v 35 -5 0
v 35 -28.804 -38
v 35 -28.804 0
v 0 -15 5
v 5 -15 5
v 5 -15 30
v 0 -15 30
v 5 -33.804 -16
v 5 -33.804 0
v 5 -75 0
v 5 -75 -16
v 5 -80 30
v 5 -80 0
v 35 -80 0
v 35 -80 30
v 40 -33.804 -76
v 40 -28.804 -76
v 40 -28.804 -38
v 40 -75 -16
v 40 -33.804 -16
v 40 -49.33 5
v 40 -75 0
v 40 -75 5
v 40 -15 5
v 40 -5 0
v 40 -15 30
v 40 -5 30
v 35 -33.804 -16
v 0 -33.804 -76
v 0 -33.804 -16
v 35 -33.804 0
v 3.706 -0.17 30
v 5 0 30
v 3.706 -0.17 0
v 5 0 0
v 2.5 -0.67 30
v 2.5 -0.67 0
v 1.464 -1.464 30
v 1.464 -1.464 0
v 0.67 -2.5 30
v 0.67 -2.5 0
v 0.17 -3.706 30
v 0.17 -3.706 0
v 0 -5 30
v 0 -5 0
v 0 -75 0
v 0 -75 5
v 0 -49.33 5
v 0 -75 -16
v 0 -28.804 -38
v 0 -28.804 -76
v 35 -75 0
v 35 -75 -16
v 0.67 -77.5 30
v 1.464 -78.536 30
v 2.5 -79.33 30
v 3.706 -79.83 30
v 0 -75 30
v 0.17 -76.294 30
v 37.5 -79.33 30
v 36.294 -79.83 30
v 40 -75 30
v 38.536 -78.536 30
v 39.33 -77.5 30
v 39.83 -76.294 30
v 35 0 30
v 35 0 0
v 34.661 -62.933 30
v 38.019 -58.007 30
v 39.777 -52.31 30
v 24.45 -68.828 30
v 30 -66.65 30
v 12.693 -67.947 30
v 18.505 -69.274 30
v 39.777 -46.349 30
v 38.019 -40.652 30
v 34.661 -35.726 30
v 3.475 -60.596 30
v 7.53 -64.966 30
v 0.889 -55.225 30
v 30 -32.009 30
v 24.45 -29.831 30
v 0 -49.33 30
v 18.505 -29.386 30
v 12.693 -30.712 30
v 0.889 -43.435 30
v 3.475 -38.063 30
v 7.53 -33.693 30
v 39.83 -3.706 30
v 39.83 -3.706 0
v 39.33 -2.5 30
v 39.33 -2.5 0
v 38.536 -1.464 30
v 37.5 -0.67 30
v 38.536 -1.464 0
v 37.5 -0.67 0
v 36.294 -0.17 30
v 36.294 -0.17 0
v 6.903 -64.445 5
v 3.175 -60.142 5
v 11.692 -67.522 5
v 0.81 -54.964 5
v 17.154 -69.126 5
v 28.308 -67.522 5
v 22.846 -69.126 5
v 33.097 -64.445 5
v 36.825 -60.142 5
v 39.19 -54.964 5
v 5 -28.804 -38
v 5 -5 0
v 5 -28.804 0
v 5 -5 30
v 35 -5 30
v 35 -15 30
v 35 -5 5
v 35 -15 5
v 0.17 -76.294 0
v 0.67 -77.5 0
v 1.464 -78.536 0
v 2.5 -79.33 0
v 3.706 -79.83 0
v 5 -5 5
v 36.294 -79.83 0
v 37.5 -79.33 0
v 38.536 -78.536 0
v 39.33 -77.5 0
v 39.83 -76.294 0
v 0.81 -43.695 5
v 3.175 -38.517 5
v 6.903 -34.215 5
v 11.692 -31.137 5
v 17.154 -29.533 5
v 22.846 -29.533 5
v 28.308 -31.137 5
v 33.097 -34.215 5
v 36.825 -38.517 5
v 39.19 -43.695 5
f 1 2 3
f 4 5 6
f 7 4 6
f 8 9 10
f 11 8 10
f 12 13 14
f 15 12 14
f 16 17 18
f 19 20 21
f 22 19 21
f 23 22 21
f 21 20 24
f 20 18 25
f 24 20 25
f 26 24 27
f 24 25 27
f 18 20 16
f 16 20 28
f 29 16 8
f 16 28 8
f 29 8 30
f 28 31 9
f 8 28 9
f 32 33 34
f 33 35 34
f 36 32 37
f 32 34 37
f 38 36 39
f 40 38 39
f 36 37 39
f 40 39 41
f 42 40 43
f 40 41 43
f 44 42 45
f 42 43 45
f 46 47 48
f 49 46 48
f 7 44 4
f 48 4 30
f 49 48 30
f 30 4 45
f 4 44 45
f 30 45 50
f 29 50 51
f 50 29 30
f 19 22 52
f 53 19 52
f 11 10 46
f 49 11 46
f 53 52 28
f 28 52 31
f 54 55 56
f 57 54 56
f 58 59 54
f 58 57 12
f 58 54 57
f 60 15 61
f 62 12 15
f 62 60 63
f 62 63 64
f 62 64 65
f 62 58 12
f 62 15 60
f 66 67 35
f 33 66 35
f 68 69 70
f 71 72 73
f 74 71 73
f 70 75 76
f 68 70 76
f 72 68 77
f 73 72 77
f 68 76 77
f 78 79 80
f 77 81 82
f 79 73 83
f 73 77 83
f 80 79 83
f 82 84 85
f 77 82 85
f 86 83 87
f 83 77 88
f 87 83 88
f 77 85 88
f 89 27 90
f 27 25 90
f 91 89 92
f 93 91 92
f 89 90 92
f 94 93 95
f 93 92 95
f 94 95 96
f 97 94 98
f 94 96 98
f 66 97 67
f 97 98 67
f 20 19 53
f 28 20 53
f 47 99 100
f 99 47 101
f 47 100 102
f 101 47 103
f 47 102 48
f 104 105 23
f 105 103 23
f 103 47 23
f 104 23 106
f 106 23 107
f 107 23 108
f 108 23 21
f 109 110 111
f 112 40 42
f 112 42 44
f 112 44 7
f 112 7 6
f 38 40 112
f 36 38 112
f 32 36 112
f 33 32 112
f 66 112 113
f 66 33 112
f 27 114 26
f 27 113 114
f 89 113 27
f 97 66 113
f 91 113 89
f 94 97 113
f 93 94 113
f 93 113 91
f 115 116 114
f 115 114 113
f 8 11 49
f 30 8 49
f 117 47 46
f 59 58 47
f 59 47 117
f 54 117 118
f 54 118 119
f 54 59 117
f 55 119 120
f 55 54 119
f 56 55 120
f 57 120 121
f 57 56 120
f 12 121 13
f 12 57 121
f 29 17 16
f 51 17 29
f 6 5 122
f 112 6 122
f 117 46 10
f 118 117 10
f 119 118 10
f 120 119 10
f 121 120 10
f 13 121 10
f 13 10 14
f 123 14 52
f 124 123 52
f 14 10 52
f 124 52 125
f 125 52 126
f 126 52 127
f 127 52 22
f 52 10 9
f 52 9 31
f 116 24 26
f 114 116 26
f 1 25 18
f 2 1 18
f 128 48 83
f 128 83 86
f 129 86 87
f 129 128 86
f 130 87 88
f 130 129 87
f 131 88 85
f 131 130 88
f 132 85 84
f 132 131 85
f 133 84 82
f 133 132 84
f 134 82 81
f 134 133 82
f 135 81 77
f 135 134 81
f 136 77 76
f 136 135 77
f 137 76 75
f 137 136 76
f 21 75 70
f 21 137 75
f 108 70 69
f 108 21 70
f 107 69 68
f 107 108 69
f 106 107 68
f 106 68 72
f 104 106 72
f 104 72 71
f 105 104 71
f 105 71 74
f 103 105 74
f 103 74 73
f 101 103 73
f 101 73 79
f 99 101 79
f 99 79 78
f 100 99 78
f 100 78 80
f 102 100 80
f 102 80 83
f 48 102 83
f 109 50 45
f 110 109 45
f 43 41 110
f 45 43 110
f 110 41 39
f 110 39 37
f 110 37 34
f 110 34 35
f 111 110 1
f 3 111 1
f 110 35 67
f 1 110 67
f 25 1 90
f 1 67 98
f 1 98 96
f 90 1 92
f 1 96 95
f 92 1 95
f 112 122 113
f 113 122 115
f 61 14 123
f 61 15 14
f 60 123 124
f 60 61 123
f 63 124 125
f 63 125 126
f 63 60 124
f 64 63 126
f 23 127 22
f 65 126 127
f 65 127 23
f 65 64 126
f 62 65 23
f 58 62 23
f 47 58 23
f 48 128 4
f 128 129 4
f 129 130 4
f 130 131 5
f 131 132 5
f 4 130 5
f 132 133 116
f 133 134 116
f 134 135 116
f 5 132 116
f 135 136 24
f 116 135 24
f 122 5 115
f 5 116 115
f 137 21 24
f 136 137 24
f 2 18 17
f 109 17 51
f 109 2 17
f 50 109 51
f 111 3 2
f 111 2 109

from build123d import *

# Parameters (mm, degrees)
IZIM1_W                     = 30
IZIM1_H                     = 70
Y_KSEKLIK_EKSTR_ZYON1_DEPTH = 30
IZIM2_W                     = 40
IZIM2_H                     = 80
Y_KSEKLIK_EKSTR_ZYON2_DEPTH = 5
RADYUS1_R                   = 5
RADYUS2_R                   = 5
RADYUS3_R                   = 5
RADYUS4_R                   = 5
IZIM4_W                     = 15
IZIM4_H                     = 50
IZIM4_W_2                   = 10
KES_EKSTR_ZYON1_DEPTH       = 59
IZIM5_R                     = 20
Y_KSEKLIK_EKSTR_ZYON4_DEPTH = 30
IZIM6_W                     = 25
IZIM6_H                     = 10
KES_EKSTR_ZYON4_DEPTH       = 7
IZIM7_W                     = 25
IZIM7_H                     = 10
KES_EKSTR_ZYON6_DEPTH       = 7
Y_KSEKLIK_EKSTR_ZYON5_DEPTH = 16
IZIM13_W                    = 40
IZIM13_H                    = 5
Y_KSEKLIK_EKSTR_ZYON6_DEPTH = 60
Y_KSEKLIK_EKSTR_ZYON7_DEPTH = 5
Y_KSEKLIK_EKSTR_ZYON8_DEPTH = 5


with BuildPart() as part:
    # Çizim1 → Yükseklik-Ekstrüzyon1 (new body)
    with BuildSketch(Plane.XY):
        Polygon((5, 0), (0, 0), (0, -5), (0, -80), (35, -80), (40, -80), (40, -75), (40, -5), (40, 0), (35, 0), align=None)
        with Locations((20, -40)):
            Rectangle(IZIM1_W, IZIM1_H, mode=Mode.SUBTRACT)
    extrude(amount=Y_KSEKLIK_EKSTR_ZYON1_DEPTH)

    # Çizim2 → Yükseklik-Ekstrüzyon2 (add)
    with BuildSketch(Plane(origin=(0, 0, 0), x_dir=(-1, 0, 0), z_dir=(0, 0, -1))):
        with Locations((-20, -40)):
            Rectangle(IZIM2_W, IZIM2_H)
    extrude(amount=-Y_KSEKLIK_EKSTR_ZYON2_DEPTH)

    # Radyus1
    radyus1_edges = [part.edges().sort_by_distance(p)[0] for p in [
        (40, 0, 15),
    ]]
    fillet(radyus1_edges, radius=RADYUS1_R)

    # Radyus2
    radyus2_edges = [part.edges().sort_by_distance(p)[0] for p in [
        (0, 0, 15),
    ]]
    fillet(radyus2_edges, radius=RADYUS2_R)

    # Radyus3
    radyus3_edges = [part.edges().sort_by_distance(p)[0] for p in [
        (0, -80, 15),
    ]]
    fillet(radyus3_edges, radius=RADYUS3_R)

    # Radyus4
    radyus4_edges = [part.edges().sort_by_distance(p)[0] for p in [
        (40, -80, 15),
    ]]
    fillet(radyus4_edges, radius=RADYUS4_R)

    # Çizim4 → Kes-Ekstrüzyon1 (cut)
    with BuildSketch(Plane(origin=(40, 0, 0), x_dir=(0, 0, -1), z_dir=(1, 0, 0))):
        with Locations((-22.5, -40)):
            Rectangle(IZIM4_W, IZIM4_H)
        with Locations((-10, -40)):
            Rectangle(IZIM4_W_2, IZIM4_H)
    extrude(amount=-KES_EKSTR_ZYON1_DEPTH, mode=Mode.SUBTRACT)

    # Çizim5 → Yükseklik-Ekstrüzyon4 (add)
    with BuildSketch(Plane(origin=(0, 0, 0), x_dir=(-1, 0, 0), z_dir=(0, 0, -1))):
        with Locations((-20, -49.329631519)):
            Circle(IZIM5_R)
    extrude(amount=-Y_KSEKLIK_EKSTR_ZYON4_DEPTH)

    # Çizim6 → Kes-Ekstrüzyon4 (cut)
    with BuildSketch(Plane(origin=(40, 0, 0), x_dir=(0, 0, -1), z_dir=(1, 0, 0))):
        with Locations((-17.5, -70)):
            Rectangle(IZIM6_W, IZIM6_H)
    extrude(amount=-KES_EKSTR_ZYON4_DEPTH, mode=Mode.SUBTRACT)

    # Çizim7 → Kes-Ekstrüzyon6 (cut)
    with BuildSketch(Plane.ZY):
        with Locations((17.5, -70)):
            Rectangle(IZIM7_W, IZIM7_H)
    extrude(amount=-KES_EKSTR_ZYON6_DEPTH, mode=Mode.SUBTRACT)

    # Çizim12 → Yükseklik-Ekstrüzyon5 (add)
    with BuildSketch(Plane(origin=(0, 0, 0), x_dir=(-1, 0, 0), z_dir=(0, 0, -1))):
        Polygon((-35.259105609, -28.804442177), (-40, -28.804442177), (-40, -33.804442177), (-40, -75), (-35, -75), (-35, -33.804442177), (-5, -33.804442177), (-5, -75), (0, -75), (0, -33.804442177), (0, -28.804442177), (-5, -28.804442177), (-35, -28.804442177), align=None)
    extrude(amount=Y_KSEKLIK_EKSTR_ZYON5_DEPTH)

    # Çizim13 → Yükseklik-Ekstrüzyon6 (add)
    with BuildSketch(Plane(origin=(0, 0, -16), x_dir=(-1, 0, 0), z_dir=(0, 0, -1))):
        with Locations((-20, -31.304442177)):
            Rectangle(IZIM13_W, IZIM13_H)
    extrude(amount=Y_KSEKLIK_EKSTR_ZYON6_DEPTH)

    # Çizim14 → Yükseklik-Ekstrüzyon7 (add)
    with BuildSketch(Plane(origin=(40, 0, 0), x_dir=(0, 0, -1), z_dir=(1, 0, 0))):
        Polygon((0, -5), (38, -28.804442177), (0, -28.804442177), align=None)
    extrude(amount=-Y_KSEKLIK_EKSTR_ZYON7_DEPTH)

    # Çizim15 → Yükseklik-Ekstrüzyon8 (add)
    with BuildSketch(Plane.ZY):
        Polygon((-38, -28.804442177), (0, -5), (0, -28.804442177), align=None)
    extrude(amount=-Y_KSEKLIK_EKSTR_ZYON8_DEPTH)


solid = part.part
